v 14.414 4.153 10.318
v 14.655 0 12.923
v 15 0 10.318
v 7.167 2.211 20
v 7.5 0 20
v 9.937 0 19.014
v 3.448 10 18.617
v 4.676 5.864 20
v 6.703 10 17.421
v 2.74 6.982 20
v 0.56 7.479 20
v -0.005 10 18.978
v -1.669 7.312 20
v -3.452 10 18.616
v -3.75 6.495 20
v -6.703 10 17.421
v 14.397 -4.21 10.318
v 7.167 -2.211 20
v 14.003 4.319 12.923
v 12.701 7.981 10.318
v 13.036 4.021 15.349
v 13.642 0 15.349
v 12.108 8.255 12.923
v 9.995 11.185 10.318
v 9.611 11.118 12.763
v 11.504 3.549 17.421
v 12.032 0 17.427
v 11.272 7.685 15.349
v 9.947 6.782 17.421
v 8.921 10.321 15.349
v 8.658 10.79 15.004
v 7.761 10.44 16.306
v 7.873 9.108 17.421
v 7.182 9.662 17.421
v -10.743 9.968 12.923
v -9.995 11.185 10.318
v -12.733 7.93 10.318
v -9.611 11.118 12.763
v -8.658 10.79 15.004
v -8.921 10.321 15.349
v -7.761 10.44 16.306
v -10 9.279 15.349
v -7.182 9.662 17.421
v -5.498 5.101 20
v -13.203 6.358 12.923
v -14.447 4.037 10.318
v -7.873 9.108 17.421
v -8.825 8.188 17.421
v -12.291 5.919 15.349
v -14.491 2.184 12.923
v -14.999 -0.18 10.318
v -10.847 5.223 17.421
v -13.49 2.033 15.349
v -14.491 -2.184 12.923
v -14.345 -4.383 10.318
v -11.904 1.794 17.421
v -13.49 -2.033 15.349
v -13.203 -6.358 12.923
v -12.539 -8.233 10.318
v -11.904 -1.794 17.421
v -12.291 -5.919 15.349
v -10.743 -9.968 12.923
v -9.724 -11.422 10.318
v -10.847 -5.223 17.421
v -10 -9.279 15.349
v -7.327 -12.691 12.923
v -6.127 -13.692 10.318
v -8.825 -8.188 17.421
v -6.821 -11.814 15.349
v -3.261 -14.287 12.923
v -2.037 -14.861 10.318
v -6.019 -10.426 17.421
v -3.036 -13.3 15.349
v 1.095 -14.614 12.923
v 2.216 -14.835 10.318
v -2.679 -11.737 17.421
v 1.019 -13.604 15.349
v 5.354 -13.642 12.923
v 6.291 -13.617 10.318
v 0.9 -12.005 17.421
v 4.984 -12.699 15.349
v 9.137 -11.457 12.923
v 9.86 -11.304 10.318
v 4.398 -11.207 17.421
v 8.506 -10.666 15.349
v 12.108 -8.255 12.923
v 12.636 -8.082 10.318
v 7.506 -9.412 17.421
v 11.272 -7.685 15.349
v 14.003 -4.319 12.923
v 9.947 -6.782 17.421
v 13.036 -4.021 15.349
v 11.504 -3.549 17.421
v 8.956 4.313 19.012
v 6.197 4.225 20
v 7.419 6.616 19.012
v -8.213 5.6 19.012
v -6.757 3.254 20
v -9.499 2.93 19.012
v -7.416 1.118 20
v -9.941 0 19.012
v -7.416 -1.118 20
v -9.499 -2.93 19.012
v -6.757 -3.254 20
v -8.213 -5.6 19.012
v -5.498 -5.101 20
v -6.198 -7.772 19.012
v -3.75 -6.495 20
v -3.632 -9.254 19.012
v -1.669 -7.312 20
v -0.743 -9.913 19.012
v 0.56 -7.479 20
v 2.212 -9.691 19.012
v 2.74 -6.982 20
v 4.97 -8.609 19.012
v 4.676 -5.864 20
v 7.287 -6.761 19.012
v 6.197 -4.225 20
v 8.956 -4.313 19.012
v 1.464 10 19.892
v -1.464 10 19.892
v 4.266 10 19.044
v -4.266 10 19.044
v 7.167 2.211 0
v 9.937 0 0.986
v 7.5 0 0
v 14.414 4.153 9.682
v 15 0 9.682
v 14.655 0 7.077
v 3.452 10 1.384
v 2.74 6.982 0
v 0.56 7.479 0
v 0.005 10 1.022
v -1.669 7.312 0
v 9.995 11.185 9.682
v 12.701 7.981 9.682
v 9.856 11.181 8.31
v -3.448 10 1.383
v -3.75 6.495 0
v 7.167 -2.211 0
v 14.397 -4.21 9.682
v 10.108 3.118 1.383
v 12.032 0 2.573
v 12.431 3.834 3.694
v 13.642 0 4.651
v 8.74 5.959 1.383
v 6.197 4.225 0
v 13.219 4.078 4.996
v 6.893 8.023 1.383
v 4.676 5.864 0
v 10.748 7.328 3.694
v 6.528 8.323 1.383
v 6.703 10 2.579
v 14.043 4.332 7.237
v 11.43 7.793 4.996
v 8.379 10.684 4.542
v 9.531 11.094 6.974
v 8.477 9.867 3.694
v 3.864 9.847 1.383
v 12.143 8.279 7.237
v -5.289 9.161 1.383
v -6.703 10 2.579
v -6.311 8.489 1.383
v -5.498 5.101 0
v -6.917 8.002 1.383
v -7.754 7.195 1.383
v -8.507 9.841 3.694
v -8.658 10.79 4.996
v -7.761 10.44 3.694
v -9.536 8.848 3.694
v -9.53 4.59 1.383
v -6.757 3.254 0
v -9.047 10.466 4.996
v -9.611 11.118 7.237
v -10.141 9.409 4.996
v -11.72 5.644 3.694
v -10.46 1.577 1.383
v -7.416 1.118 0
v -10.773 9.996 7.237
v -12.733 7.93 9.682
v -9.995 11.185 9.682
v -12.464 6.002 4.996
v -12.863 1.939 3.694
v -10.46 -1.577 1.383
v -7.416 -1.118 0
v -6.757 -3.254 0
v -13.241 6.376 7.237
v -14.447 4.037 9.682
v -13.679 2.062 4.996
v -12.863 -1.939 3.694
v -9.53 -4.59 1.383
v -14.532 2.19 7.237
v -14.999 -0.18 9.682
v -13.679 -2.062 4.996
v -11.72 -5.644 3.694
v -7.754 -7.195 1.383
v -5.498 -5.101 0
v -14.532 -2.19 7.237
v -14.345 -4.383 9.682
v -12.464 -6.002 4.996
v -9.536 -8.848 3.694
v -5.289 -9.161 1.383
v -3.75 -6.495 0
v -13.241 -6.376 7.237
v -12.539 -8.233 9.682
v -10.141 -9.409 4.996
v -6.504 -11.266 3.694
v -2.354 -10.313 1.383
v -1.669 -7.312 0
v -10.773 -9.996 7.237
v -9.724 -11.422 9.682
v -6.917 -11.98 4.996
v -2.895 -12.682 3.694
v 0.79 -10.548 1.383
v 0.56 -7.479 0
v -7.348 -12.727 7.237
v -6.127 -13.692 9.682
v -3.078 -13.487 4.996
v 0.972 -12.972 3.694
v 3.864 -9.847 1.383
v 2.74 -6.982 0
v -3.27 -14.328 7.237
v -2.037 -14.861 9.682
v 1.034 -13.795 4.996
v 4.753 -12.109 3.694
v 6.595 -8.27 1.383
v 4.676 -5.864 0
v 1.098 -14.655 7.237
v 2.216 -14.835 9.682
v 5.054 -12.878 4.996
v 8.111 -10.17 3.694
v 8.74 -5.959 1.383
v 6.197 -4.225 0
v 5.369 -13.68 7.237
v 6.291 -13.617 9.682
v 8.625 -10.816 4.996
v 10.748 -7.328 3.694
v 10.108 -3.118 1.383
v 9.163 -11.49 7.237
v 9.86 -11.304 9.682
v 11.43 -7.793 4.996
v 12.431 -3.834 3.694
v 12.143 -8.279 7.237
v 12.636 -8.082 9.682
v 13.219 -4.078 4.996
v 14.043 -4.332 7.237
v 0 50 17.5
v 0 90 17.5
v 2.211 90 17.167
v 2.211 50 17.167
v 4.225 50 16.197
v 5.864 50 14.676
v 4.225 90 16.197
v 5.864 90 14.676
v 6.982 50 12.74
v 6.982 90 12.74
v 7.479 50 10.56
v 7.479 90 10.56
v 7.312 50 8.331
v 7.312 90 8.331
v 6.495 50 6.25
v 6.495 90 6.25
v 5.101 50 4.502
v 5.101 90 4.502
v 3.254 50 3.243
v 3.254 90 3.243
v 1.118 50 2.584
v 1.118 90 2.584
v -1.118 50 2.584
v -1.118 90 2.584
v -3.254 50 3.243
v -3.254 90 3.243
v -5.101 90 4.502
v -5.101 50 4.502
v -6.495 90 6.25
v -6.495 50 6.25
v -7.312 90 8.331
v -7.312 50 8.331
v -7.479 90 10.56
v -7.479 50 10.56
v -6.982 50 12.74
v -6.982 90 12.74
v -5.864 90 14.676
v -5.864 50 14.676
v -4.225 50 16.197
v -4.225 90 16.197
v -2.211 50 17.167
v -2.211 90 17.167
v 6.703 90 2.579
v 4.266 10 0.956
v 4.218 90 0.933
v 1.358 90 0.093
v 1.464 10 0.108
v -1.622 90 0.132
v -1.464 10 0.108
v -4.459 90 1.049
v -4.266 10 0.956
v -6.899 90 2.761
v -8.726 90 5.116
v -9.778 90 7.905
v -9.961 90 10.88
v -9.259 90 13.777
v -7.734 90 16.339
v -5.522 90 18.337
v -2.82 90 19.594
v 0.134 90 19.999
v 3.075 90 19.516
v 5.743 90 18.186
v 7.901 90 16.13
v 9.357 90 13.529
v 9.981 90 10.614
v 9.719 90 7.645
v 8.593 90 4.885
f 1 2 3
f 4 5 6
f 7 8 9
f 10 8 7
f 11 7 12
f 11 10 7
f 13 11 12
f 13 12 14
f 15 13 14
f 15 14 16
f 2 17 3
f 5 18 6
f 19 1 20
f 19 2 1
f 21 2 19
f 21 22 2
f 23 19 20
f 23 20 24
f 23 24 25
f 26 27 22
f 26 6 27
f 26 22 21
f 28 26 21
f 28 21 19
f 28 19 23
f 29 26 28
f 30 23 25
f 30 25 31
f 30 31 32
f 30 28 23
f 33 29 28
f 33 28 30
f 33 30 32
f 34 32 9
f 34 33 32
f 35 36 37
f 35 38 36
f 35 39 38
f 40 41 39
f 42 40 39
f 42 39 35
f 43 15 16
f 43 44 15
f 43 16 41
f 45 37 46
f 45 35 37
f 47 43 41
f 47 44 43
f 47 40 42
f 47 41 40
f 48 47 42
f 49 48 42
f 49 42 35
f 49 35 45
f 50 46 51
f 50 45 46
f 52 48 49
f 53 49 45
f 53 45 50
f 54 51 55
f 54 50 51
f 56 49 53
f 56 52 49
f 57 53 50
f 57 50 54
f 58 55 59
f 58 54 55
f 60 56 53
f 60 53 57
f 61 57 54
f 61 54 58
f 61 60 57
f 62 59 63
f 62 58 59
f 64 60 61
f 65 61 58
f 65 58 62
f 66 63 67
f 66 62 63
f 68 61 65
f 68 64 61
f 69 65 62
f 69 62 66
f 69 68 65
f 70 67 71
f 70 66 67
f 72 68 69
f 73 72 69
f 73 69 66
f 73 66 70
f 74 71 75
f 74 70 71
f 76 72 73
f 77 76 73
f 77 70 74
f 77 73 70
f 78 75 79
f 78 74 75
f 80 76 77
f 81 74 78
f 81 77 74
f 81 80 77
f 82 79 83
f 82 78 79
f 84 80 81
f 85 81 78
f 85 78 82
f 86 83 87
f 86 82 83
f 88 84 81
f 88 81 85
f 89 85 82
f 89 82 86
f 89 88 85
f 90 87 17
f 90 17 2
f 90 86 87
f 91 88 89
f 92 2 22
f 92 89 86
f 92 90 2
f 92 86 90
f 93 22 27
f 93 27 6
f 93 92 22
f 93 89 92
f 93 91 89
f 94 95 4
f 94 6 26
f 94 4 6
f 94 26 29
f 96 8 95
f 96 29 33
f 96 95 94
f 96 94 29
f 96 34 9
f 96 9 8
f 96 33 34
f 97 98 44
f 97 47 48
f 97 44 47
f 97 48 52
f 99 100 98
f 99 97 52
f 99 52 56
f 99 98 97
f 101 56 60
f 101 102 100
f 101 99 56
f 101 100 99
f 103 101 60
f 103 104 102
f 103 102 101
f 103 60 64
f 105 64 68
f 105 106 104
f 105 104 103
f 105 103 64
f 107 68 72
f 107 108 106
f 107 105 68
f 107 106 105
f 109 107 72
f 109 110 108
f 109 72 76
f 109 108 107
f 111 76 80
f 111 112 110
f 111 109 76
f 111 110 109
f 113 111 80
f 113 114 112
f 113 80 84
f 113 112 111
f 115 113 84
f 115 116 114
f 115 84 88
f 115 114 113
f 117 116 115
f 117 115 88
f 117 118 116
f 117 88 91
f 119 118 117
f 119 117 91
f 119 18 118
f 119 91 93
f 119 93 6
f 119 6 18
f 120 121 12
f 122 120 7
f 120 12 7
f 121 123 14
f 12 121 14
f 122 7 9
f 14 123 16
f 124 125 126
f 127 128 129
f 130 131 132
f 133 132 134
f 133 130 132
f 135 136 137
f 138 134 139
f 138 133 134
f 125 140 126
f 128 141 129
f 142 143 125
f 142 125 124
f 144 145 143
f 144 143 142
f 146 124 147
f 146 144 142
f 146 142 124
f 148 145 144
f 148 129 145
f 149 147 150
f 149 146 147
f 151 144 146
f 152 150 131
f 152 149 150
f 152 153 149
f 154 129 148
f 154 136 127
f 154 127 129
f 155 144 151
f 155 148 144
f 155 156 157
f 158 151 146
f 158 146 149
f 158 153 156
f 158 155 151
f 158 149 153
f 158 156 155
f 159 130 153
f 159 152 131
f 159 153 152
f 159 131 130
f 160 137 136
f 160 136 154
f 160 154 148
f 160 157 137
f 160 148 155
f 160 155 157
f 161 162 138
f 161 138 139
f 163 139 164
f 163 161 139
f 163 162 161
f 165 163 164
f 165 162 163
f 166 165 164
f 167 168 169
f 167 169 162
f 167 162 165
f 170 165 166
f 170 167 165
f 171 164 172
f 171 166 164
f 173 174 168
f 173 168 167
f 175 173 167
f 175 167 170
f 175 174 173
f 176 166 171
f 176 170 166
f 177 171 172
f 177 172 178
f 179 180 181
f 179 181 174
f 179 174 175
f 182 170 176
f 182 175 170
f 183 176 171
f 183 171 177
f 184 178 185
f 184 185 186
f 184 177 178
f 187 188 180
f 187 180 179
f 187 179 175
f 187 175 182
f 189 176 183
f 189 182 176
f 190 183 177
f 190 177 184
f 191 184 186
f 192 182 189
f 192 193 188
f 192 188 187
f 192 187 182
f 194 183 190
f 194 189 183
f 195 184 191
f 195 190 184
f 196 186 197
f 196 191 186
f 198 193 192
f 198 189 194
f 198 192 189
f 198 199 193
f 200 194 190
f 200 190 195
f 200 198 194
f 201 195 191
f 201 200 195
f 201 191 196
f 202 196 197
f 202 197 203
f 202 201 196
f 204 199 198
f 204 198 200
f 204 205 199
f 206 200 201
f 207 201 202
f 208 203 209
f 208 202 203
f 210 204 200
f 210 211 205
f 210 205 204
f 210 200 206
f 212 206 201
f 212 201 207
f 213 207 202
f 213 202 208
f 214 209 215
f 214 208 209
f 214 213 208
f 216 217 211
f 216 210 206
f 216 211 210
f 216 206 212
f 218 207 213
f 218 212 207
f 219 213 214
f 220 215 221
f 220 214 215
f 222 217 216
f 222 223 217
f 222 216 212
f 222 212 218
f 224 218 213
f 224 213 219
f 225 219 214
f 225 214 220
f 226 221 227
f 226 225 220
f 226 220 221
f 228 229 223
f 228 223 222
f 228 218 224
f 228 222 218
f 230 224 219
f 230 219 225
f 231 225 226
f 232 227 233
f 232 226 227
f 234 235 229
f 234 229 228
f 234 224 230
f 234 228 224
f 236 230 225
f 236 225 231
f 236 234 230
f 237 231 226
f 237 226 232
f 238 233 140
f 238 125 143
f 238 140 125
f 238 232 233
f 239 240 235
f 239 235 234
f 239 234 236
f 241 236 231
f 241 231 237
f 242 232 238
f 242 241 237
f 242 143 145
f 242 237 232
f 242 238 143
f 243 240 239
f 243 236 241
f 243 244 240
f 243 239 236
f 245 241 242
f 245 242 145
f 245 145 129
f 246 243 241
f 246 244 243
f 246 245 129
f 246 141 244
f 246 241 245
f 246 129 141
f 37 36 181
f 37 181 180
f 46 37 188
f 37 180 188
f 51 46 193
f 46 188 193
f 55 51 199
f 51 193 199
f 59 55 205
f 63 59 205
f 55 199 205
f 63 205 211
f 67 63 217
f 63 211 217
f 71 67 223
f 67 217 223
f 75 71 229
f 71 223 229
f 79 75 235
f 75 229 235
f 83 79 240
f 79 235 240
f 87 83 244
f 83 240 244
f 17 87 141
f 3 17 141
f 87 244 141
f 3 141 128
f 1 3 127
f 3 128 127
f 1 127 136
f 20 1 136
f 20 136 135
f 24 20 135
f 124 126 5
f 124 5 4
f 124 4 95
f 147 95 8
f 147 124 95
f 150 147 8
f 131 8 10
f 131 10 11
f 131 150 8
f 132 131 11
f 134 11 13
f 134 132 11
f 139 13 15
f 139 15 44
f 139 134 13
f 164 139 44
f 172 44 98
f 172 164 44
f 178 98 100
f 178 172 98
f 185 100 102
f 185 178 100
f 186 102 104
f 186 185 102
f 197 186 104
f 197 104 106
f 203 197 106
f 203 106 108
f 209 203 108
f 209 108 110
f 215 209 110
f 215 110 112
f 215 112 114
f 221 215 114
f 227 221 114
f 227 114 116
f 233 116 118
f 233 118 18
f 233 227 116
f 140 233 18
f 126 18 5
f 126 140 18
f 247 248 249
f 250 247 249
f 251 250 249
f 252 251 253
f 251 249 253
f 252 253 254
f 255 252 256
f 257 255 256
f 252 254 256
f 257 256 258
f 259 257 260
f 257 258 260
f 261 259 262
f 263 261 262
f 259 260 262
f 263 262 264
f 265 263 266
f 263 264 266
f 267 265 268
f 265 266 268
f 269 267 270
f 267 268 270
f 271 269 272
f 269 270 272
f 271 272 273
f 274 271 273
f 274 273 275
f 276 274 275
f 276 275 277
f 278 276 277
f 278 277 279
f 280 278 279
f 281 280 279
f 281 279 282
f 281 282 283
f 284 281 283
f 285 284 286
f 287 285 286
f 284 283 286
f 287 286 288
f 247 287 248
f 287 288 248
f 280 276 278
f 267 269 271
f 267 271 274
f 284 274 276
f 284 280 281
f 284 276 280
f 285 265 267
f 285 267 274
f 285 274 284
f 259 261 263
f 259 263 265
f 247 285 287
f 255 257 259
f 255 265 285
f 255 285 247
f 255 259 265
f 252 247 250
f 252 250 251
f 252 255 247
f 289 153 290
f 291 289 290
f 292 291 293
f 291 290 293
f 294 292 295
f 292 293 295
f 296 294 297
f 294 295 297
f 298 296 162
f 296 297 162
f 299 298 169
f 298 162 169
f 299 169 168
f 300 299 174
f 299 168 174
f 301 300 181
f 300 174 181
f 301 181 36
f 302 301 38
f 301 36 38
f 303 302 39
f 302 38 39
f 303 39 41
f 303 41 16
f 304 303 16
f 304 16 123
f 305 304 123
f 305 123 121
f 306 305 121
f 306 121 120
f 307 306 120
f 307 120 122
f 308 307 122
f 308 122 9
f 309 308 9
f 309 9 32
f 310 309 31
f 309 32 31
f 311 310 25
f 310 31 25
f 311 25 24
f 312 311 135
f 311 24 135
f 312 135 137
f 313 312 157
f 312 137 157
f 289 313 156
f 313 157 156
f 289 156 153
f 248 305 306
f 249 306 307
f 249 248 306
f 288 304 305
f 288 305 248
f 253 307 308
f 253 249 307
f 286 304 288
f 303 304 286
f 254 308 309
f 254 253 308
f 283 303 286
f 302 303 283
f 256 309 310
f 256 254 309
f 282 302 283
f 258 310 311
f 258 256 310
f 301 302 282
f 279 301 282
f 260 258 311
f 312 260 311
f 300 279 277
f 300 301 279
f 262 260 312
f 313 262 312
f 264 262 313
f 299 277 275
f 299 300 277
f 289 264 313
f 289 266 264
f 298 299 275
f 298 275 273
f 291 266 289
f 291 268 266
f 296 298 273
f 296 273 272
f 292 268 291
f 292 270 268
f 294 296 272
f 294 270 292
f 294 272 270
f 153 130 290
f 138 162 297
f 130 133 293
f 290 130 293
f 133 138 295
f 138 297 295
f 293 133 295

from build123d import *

# Parameters (mm, degrees)
SKETCH1_R           = 15
SKETCH1_R_2         = 7.5
BOSS_EXTRUDE1_DEPTH = 20
FILLET1_R           = 10
BOSS_EXTRUDE2_START = 10
SKETCH2_R           = 10
BOSS_EXTRUDE2_DEPTH = 80
SKETCH3_R           = 7.5
CUT_EXTRUDE1_DEPTH  = 40


with BuildPart() as part:
    # Sketch1 → Boss-Extrude1 (new body)
    with BuildSketch(Plane.XY):
        Circle(SKETCH1_R)
        Circle(SKETCH1_R_2, mode=Mode.SUBTRACT)
    extrude(amount=BOSS_EXTRUDE1_DEPTH)

    # Fillet1
    # the kernel refuses this fillet: 10 mm, written as the material it takes off along each edge
    with BuildSketch(Plane(origin=(0, 0, 0), x_dir=(1, 0, 0), z_dir=(0, -1, 0))) as fillet1_piece_1:
        with BuildLine():
            CenterArc((5, 9.682458366), FILLET1_R, 284.477512186, 75.522487814)
            Line((7.5, 0), (7.55, -0.193649167))
            ThreePointArc((7.55, -0.193649167), (11.25, -0.2), (15, -0.2))
            Line((15, -0.2), (15.2, 0))
            Line((15.2, 0), (15.2, 9.682458366))
            Line((15.2, 9.682458366), (15, 9.682458366))
        make_face()
    revolve(axis=Axis((0, 0, 0), (0, 0, 1)), mode=Mode.SUBTRACT)
    with BuildSketch(Plane(origin=(0, 0, 20), x_dir=(1, 0, 0), z_dir=(0, -1, 0))) as fillet1_piece_2:
        with BuildLine():
            CenterArc((5, -9.682458366), FILLET1_R, 0, 75.522487814)
            Line((7.5, 0), (7.55, 0.193649167))
            ThreePointArc((7.55, 0.193649167), (11.25, 0.2), (15, 0.2))
            Line((15, 0.2), (15.2, 0))
            Line((15.2, 0), (15.2, -9.682458366))
            Line((15.2, -9.682458366), (15, -9.682458366))
        make_face()
    revolve(axis=Axis((0, 0, 20), (0, 0, 1)), mode=Mode.SUBTRACT)

    # Sketch2 → Boss-Extrude2 (add)
    with BuildSketch(Plane(origin=(0, 0, 0), x_dir=(1, 0, 0), z_dir=(0, 1, 0)).offset(BOSS_EXTRUDE2_START)):
        with Locations(Location((0, -10, 0), (0, 0, 47.908263914))):
            Circle(SKETCH2_R)
    extrude(amount=BOSS_EXTRUDE2_DEPTH)

    # Sketch3 → Cut-Extrude1 (cut)
    with BuildSketch(Plane(origin=(0, 90, 0), x_dir=(1, 0, 0), z_dir=(0, 1, 0))):
        with Locations(Location((0, -10, 0), (0, 0, 270))):
            Circle(SKETCH3_R)
    extrude(amount=-CUT_EXTRUDE1_DEPTH, mode=Mode.SUBTRACT)


solid = part.part
